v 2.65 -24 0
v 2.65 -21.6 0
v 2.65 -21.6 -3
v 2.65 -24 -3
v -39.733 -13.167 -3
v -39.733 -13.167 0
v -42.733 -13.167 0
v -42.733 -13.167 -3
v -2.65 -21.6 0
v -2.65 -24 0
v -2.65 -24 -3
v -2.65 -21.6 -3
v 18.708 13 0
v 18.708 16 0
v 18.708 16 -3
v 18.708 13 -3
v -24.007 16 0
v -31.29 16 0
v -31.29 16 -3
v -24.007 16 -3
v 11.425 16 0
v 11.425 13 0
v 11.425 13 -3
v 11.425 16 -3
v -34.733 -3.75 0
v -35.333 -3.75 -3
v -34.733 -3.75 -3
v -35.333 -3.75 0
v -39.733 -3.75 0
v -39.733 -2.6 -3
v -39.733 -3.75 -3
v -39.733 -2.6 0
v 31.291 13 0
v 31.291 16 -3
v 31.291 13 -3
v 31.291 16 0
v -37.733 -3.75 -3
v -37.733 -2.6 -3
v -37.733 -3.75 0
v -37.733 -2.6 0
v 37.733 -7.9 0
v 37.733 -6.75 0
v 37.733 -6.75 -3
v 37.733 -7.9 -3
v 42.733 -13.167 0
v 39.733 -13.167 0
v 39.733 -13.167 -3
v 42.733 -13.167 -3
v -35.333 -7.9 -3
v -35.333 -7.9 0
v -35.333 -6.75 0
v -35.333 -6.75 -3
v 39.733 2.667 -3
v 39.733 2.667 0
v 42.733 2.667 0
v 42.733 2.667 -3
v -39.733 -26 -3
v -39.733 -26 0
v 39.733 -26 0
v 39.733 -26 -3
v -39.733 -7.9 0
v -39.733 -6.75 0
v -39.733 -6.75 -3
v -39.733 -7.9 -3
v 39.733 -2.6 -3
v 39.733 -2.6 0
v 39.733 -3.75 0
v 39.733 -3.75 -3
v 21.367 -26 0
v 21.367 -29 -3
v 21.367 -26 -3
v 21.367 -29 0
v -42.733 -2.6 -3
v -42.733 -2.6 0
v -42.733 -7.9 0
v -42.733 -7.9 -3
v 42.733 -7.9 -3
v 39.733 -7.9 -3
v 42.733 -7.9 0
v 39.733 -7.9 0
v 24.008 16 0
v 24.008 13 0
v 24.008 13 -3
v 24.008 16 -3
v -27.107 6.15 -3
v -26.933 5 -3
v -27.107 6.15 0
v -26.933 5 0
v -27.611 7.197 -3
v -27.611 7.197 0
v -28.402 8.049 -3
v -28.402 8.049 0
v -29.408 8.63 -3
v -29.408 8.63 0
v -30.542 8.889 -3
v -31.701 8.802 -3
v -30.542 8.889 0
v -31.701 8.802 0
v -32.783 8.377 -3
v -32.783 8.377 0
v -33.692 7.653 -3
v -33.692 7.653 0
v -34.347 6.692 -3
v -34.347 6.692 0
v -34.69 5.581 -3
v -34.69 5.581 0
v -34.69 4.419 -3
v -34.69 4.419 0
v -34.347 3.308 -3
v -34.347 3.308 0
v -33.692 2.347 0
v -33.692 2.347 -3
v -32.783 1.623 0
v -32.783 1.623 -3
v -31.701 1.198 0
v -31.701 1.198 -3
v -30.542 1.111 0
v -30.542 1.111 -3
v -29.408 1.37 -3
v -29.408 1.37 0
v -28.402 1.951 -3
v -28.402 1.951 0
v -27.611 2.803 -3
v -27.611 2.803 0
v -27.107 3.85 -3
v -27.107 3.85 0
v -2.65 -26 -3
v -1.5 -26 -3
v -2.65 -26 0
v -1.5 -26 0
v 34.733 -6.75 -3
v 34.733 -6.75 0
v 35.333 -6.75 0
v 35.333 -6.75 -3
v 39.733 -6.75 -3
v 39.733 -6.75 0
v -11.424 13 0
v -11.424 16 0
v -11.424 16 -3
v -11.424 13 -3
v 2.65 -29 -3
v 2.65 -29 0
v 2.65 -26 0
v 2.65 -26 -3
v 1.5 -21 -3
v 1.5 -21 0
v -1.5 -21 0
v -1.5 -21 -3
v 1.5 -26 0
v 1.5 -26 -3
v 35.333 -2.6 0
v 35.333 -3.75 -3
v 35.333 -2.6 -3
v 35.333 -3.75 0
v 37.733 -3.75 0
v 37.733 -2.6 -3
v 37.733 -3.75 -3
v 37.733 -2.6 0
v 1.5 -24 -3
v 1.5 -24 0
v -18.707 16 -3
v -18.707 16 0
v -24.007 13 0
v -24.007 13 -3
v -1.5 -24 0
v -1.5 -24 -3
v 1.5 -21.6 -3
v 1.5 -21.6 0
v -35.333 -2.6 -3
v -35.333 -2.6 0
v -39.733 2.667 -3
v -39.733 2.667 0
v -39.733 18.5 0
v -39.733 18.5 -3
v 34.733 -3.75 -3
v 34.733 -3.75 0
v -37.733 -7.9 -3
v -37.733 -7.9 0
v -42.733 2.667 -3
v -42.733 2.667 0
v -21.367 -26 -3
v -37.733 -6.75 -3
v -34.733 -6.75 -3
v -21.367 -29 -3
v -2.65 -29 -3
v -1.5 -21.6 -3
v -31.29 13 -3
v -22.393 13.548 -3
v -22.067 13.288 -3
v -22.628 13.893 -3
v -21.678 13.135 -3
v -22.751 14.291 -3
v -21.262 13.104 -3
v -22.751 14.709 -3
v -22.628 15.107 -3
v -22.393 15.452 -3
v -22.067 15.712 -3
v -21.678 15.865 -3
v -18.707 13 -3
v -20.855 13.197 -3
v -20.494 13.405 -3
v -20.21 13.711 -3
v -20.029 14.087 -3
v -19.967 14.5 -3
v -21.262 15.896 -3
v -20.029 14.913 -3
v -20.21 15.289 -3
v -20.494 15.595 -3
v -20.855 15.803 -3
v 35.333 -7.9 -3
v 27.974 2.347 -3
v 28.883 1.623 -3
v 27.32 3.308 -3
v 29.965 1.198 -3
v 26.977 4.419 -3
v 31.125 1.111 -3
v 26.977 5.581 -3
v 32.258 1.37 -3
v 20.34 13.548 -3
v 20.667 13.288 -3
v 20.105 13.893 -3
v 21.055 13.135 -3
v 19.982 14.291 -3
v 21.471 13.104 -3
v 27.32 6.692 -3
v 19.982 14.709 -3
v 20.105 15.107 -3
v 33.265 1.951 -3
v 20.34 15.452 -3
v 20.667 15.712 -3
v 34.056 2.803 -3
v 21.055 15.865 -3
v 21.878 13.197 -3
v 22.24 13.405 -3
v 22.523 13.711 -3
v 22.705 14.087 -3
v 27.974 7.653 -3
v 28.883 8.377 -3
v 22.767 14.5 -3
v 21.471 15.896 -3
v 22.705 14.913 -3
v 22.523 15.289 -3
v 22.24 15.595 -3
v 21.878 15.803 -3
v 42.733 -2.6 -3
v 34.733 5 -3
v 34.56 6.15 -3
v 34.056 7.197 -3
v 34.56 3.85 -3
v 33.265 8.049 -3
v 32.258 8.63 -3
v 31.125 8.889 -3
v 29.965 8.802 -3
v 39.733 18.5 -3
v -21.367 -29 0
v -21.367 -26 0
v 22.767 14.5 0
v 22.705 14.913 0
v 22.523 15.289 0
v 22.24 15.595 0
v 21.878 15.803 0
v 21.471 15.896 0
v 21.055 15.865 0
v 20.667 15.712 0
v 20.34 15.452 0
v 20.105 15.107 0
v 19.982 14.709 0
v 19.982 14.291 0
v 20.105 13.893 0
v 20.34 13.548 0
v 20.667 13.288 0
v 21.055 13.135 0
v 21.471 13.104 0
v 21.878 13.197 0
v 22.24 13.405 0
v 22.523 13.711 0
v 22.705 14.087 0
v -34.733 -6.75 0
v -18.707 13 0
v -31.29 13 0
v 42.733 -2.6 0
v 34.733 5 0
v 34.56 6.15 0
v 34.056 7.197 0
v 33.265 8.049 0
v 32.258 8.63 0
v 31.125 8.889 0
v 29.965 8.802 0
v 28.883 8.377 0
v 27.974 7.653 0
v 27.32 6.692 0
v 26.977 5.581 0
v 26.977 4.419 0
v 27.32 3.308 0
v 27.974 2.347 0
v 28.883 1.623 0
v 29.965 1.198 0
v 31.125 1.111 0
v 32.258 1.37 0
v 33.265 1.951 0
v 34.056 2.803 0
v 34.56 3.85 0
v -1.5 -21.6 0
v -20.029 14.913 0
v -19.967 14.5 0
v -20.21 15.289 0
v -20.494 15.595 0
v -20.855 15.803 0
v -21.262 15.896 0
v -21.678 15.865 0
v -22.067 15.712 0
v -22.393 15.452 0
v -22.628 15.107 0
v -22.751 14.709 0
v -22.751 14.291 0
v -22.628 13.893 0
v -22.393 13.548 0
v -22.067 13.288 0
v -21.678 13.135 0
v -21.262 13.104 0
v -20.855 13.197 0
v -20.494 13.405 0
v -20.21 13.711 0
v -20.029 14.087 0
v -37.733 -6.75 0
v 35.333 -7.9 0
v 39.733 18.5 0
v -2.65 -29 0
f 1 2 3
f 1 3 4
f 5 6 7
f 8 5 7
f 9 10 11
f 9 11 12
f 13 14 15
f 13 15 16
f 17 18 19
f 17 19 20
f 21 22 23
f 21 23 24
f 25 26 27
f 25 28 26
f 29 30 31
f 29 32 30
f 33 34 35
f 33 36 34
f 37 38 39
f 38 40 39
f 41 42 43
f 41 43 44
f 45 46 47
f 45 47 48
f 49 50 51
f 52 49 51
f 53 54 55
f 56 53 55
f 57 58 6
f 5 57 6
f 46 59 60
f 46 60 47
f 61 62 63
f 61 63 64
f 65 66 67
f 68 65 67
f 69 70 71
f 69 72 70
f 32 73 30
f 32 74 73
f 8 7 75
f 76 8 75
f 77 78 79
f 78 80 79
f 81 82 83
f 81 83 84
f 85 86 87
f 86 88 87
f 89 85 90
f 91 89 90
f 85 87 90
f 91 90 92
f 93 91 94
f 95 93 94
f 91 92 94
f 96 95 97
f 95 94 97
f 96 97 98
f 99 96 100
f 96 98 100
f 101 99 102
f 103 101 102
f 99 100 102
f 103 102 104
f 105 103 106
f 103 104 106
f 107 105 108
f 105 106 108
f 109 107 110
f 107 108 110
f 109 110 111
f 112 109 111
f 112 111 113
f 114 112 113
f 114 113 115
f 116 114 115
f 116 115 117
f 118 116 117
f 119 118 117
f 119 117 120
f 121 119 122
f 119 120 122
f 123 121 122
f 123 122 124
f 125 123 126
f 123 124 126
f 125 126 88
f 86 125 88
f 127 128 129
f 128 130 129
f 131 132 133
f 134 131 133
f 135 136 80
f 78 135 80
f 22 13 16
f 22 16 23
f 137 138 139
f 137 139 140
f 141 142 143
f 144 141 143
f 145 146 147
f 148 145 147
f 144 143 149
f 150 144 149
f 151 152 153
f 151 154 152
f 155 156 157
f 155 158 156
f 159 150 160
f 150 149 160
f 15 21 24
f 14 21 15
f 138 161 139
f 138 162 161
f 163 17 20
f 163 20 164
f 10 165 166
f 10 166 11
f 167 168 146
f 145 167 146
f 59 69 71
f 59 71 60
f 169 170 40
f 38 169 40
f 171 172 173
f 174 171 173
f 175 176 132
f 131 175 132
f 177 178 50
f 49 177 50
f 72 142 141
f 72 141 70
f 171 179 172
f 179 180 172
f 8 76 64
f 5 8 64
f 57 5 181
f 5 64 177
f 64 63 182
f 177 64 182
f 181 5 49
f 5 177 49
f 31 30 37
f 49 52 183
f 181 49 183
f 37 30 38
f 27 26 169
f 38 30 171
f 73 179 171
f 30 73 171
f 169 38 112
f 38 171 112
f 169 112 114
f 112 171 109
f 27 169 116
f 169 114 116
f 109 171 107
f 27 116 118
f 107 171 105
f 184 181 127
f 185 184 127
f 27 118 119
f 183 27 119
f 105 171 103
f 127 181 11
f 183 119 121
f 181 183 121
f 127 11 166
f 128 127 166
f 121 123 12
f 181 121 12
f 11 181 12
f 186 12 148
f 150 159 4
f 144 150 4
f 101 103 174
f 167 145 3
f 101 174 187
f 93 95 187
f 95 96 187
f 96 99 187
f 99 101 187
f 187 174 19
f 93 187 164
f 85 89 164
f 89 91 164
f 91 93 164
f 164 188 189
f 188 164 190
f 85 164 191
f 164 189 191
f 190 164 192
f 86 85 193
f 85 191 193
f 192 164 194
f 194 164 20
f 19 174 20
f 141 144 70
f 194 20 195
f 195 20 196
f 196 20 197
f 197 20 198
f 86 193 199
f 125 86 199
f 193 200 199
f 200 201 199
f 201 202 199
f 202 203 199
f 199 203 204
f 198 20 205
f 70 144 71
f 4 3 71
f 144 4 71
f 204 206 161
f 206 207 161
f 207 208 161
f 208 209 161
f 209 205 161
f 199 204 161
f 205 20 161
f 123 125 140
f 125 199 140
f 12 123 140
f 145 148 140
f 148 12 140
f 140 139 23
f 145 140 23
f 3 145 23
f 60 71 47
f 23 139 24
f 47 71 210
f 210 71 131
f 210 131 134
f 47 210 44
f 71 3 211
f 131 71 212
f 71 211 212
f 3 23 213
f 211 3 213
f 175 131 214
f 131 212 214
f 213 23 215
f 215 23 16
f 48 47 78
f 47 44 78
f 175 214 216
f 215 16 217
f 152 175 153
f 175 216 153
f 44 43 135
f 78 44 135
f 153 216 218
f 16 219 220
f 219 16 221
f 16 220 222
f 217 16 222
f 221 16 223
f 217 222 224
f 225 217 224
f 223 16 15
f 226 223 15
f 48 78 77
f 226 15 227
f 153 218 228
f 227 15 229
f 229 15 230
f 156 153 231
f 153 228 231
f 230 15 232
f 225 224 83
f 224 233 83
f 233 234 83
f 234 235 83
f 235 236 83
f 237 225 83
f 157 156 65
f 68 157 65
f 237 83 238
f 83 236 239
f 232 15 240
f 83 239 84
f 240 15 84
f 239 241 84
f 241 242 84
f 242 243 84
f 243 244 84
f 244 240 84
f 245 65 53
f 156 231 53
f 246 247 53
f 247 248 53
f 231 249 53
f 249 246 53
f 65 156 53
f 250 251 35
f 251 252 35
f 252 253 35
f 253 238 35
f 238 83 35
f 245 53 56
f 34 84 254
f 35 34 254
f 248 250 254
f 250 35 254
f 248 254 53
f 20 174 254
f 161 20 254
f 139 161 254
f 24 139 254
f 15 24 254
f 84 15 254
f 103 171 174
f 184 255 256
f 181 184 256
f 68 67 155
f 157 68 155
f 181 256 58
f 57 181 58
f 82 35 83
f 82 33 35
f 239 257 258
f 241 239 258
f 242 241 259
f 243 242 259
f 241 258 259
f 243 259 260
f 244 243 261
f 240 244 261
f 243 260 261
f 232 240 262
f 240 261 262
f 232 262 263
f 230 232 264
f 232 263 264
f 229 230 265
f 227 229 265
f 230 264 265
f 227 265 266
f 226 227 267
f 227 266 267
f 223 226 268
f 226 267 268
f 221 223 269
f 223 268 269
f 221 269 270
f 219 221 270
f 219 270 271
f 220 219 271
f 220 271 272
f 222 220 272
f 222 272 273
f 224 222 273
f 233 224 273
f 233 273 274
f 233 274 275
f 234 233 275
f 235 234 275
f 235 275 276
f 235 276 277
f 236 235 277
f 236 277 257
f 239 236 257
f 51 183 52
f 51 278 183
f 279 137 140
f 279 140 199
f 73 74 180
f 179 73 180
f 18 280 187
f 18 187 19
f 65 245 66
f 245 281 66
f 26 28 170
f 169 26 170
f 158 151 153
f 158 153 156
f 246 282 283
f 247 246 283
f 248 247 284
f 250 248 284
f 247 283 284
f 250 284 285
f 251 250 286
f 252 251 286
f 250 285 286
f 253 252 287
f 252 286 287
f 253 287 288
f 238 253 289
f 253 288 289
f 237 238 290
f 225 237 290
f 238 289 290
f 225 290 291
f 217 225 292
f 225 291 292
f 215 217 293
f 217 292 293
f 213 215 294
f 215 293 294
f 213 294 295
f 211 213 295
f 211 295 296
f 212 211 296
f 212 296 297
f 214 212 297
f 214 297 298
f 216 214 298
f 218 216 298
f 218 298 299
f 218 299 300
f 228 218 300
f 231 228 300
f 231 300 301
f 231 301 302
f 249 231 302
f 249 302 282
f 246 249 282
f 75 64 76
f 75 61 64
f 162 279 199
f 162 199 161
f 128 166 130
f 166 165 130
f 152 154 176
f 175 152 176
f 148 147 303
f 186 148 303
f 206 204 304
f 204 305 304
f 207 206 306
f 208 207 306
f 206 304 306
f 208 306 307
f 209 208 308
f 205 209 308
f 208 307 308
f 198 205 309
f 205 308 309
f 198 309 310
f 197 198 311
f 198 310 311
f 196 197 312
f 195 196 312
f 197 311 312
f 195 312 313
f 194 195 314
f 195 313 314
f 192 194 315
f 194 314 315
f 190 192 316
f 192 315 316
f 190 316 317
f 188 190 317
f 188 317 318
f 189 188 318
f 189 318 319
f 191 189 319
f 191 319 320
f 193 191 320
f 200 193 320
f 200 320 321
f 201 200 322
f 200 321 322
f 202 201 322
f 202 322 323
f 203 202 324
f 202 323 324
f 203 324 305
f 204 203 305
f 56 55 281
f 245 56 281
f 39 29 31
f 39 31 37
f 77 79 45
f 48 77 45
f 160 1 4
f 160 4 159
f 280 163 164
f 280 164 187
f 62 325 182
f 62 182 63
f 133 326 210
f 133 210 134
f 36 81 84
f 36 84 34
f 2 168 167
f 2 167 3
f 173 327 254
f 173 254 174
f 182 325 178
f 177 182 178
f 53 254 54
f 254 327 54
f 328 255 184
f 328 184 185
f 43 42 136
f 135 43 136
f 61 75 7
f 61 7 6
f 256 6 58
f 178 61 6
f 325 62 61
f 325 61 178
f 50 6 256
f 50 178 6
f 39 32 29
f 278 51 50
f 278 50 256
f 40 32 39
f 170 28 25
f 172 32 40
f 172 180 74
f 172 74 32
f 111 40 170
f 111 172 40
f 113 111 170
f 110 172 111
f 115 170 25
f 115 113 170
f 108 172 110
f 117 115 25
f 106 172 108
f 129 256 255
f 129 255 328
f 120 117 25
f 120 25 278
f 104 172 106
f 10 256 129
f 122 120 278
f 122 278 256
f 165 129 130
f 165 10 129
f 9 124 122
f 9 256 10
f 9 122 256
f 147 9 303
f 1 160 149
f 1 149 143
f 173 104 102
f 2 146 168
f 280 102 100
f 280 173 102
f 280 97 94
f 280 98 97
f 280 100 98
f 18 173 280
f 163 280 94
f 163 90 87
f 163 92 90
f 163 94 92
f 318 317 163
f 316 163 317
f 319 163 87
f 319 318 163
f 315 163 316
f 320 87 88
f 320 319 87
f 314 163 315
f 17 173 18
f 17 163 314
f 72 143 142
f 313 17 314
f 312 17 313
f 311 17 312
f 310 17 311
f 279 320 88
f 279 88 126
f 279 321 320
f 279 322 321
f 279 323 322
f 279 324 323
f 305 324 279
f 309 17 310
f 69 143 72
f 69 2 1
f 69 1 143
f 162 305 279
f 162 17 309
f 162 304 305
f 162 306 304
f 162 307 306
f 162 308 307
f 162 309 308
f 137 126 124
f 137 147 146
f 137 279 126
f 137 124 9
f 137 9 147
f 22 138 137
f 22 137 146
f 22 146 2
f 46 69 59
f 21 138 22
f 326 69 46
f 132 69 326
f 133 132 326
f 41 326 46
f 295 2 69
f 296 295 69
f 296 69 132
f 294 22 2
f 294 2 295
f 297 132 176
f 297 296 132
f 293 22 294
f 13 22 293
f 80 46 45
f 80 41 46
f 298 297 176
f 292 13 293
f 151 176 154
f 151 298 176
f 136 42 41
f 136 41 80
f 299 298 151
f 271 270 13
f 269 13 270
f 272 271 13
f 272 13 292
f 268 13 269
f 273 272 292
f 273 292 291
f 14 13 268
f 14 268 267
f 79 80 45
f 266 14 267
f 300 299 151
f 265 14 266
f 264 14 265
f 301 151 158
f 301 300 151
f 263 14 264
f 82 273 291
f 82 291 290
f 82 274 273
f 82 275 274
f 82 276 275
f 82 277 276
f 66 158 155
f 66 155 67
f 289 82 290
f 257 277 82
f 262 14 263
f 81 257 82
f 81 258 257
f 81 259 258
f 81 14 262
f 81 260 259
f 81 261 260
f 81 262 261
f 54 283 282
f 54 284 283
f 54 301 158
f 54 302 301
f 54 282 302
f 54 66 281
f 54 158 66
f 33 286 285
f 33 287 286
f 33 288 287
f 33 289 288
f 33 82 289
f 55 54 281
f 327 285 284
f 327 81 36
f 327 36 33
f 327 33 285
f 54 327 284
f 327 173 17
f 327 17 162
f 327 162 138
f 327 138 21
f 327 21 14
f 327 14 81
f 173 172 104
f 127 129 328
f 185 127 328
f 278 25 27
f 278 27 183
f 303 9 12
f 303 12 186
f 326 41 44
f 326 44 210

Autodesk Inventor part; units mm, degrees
ref_plane "YZ Plane" through (0, 0, 0) normal (1, 0, 0) x (0, 1, 0)
ref_plane "XZ Plane" through (0, 0, 0) normal (0, 1, 0) x (-1, 0, 0)
ref_plane "XY Plane" through (0, 0, 0) normal (0, 0, 1) x (1, 0, 0)
sketch "Sketch1" plane through (0, 0, 0) normal (0, 0, 1) x (1, 0, 0)
  circle A0 centre (0, 5) radius 7.5
  line L0 (42.7333, 18.5) -> (-42.7333, 18.5)
  line L1 (-42.7333, -29) -> (42.7333, -29)
  circle A1 centre (18.5, 5) radius 2.25
  circle A2 centre (-18.5, 5) radius 2.25
  circle A3 centre (30.8333, 5) radius 3.9
  circle A4 centre (-30.8333, 5) radius 3.9
  line L2 (42.7333, 18.5) -> (42.7333, -29)
  line L3 (-42.7333, -29) -> (-42.7333, 18.5)
  circle A5 centre (0, 5) radius 13.5 construction
  line L4 (0, 41.7106) -> (0, -39.2634) construction
  dimension "d2" = 4.5
  dimension "d3" = 4.5
  dimension "d4" = 7.8
  dimension "d5" = 7.8
  dimension "d48" = 47.5
  dimension "d58" = 15
  dimension "d63" = 27
  dimension "d75" = 34
  dimension "d76" = 30.8333
  dimension "d77" = 85.4667
  dimension "d93" = 47.5
extrude "Extrusion1" add sketch "Sketch1" against normal blind 3 contours A0 | L2 L1 L3 L0 | A1 | A2
sketch "Sketch4" plane through (0, 0, 0) normal (0, 0, 1) x (1, 0, 0)
  line L0 (42.7333, 18.5) -> (39.7333, 18.5)
  line L1 (-42.7333, 18.5) -> (-39.7333, 18.5)
  line L2 (42.7333, -29) -> (21.3667, -29)
  line L3 (21.3667, -26) -> (39.7333, -26)
  line L4 (-42.7333, -29) -> (-21.3667, -29)
  line L5 (-21.3667, -29) -> (-21.3667, -26)
  line L6 (-21.3667, -26) -> (-39.7333, -26)
  line L7 (-42.7333, -23) -> (-42.7333, -29)
  line L8 (42.7333, 18.5) -> (39.7333, 18.5)
  line L9 (39.7333, 18.5) -> (39.7333, 2.6667)
  line L10 (39.7333, 2.6667) -> (42.7333, 2.6667)
  line L11 (42.7333, 2.6667) -> (42.7333, 18.5)
  line L12 (39.7333, -26) -> (39.7333, -13.1667)
  line L13 (39.7333, -13.1667) -> (42.7333, -13.1667)
  line L14 (-42.7333, 2.6667) -> (-39.7333, 2.6667)
  line L15 (-39.7333, 2.6667) -> (-39.7333, 18.5)
  line L16 (-39.7333, 18.5) -> (-42.7333, 18.5)
  line L17 (-42.7333, 18.5) -> (-42.7333, 2.6667)
  line L18 (-42.7333, -29) -> (-39.7333, -29)
  line L19 (-39.7333, -26) -> (-39.7333, -13.1667)
  line L20 (-39.7333, -13.1667) -> (-42.7333, -13.1667)
  line L21 (-42.7333, -13.1667) -> (-42.7333, -29)
  line L22 (21.3667, -29) -> (21.3667, -26)
  line L23 (-21.3667, -23) -> (-21.3667, -29)
  line L24 (-42.7333, 18.5) -> (-39.7333, 18.5)
  line L25 (-42.7333, -29) -> (42.7333, -29) projected
  line L26 (42.7333, 18.5) -> (-42.7333, 18.5) projected
  line L27 (50.1623, -5.25) -> (-50.4474, -5.25) construction
  line L28 (42.7333, -29) -> (42.7333, 18.5) projected
  line L29 (42.7333, -3.75) -> (34.7333, -3.75)
  line L30 (34.7333, -3.75) -> (34.7333, -6.75)
  line L31 (34.7333, -6.75) -> (42.7333, -6.75)
  line L32 (42.7333, -6.75) -> (42.7333, -3.75)
  circle A0 centre (0, 5) radius 13.5 construction
  circle A1 centre (0, 5) radius 7.5 construction
  line L33 (42.7333, -2.6) -> (39.7333, -2.6)
  line L34 (39.7333, -2.6) -> (39.7333, -7.9)
  line L35 (39.7333, -7.9) -> (42.7333, -7.9)
  line L36 (42.7333, -7.9) -> (42.7333, -2.6)
  line L37 (35.3333, -2.6) -> (37.7333, -2.6)
  line L38 (37.7333, -2.6) -> (37.7333, -7.9)
  line L39 (37.7333, -7.9) -> (35.3333, -7.9)
  line L40 (35.3333, -7.9) -> (35.3333, -2.6)
  line L41 (0, 33.7344) -> (0, -36.9537) construction
  line L42 (-42.7333, 18.5) -> (-42.7333, -29) projected
  line L43 (-42.7333, -3.75) -> (-34.7333, -3.75)
  line L44 (-34.7333, -3.75) -> (-34.7333, -6.75)
  line L45 (-34.7333, -6.75) -> (-42.7333, -6.75)
  line L46 (-42.7333, -6.75) -> (-42.7333, -3.75)
  line L47 (-42.7333, -2.6) -> (-39.7333, -2.6)
  line L48 (-39.7333, -2.6) -> (-39.7333, -7.9)
  line L49 (-39.7333, -7.9) -> (-42.7333, -7.9)
  line L50 (-42.7333, -7.9) -> (-42.7333, -2.6)
  line L51 (-35.3333, -2.6) -> (-37.7333, -2.6)
  line L52 (-37.7333, -2.6) -> (-37.7333, -7.9)
  line L53 (-37.7333, -7.9) -> (-35.3333, -7.9)
  line L54 (-35.3333, -7.9) -> (-35.3333, -2.6)
  line L55 (42.7333, -29) -> (-42.7333, -29) projected
  line L56 (-1.5, -29) -> (1.5, -29)
  line L57 (1.5, -29) -> (1.5, -21)
  line L58 (1.5, -21) -> (-1.5, -21)
  line L59 (-1.5, -21) -> (-1.5, -29)
  line L60 (-2.65, -29) -> (2.65, -29)
  line L61 (2.65, -29) -> (2.65, -26)
  line L62 (2.65, -26) -> (-2.65, -26)
  line L63 (-2.65, -26) -> (-2.65, -29)
  line L64 (-2.65, -21.6) -> (2.65, -21.6)
  line L65 (2.65, -21.6) -> (2.65, -24)
  line L66 (2.65, -24) -> (-2.65, -24)
  line L67 (-2.65, -24) -> (-2.65, -21.6)
  line L68 (31.3, 16) -> (24.0167, 16) construction
  line L69 (11.4333, 16) -> (11.4333, 13) construction
  line L70 (11.4333, 13) -> (18.7167, 13) construction
  line L71 (31.3, 13) -> (31.3, 16) construction
  circle A2 centre (30.8333, 5) radius 3.9 projected
  line L72 (21.3667, 17.602) -> (21.3667, 7.8585) construction
  line L73 (18.7167, 16) -> (24.0167, 16) construction
  line L74 (24.0167, 16) -> (24.0167, 13) construction
  line L75 (24.0167, 13) -> (18.7167, 13) construction
  line L76 (18.7167, 13) -> (18.7167, 16) construction
  line L77 (18.7167, 16) -> (11.4333, 16) construction
  line L78 (24.0167, 13) -> (31.3, 13) construction
  circle A3 centre (21.3667, 14.5) radius 1.4
  line L79 (-31.3, 16) -> (-24.0167, 16) construction
  line L80 (-11.4333, 16) -> (-11.4333, 13) construction
  line L81 (-11.4333, 13) -> (-18.7167, 13) construction
  line L82 (-31.3, 13) -> (-31.3, 16) construction
  line L83 (-24.0167, 16) -> (-24.0167, 13) construction
  line L84 (-18.7167, 13) -> (-18.7167, 16) construction
  line L85 (-18.7167, 16) -> (-11.4333, 16) construction
  line L86 (-24.0167, 13) -> (-31.3, 13) construction
  circle A4 centre (-21.3667, 14.5) radius 1.4
  line L87 (42.7333, 18.5) -> (42.7333, -29) projected
  line L88 (42.7333, -13.1667) -> (42.7333, -29)
  line L89 (18.7077, 16) -> (18.7077, 13)
  line L90 (19.8577, 13) -> (18.7077, 13)
  line L91 (19.8577, 16) -> (19.8577, 13)
  line L92 (18.7077, 16) -> (19.8577, 16)
  line L93 (11.4247, 16) -> (18.7077, 16)
  line L94 (11.4247, 13) -> (11.4247, 16)
  line L95 (11.4247, 13) -> (-11.4243, 13)
  line L96 (-11.4243, 16) -> (-11.4243, 13)
  line L97 (-18.7073, 16) -> (-11.4243, 16)
  line L98 (-18.7073, 13) -> (-18.7073, 16)
  line L99 (-18.7073, 13) -> (-19.8573, 13)
  line L100 (-19.8573, 13) -> (-19.8573, 16)
  line L101 (-19.8573, 16) -> (-18.7073, 16)
  line L102 (18.7077, 13) -> (11.4247, 13)
  line L103 (-11.4243, 16) -> (11.4247, 16)
  line L104 (-11.4243, 13) -> (-18.7073, 13)
  line L105 (24.0077, 13) -> (24.0077, 16)
  line L106 (22.8577, 16) -> (24.0077, 16)
  line L107 (22.8577, 13) -> (22.8577, 16)
  line L108 (24.0077, 13) -> (22.8577, 13)
  line L109 (31.2907, 13) -> (24.0077, 13)
  line L110 (31.2907, 16) -> (31.2907, 13)
  line L111 (31.2907, 16) -> (42.7337, 16)
  line L112 (42.7337, 16) -> (42.7337, 13)
  line L113 (42.7337, 13) -> (31.2907, 13)
  line L114 (24.0077, 16) -> (31.2907, 16)
  line L115 (-42.7333, 13) -> (-42.7333, 16)
  line L116 (-42.7333, 16) -> (-31.2903, 16)
  line L117 (-31.2903, 13) -> (-31.2903, 16)
  line L118 (-24.0073, 13) -> (-31.2903, 13)
  line L119 (-24.0073, 16) -> (-24.0073, 13)
  line L120 (-24.0073, 16) -> (-22.8573, 16)
  line L121 (-22.8573, 16) -> (-22.8573, 13)
  line L122 (-22.8573, 13) -> (-24.0073, 13)
  line L123 (-31.2903, 13) -> (-42.7333, 13)
  line L124 (-31.2903, 16) -> (-24.0073, 16)
  dimension "d25" = 3
  dimension "d26" = 3
  dimension "d33" = 15.8333
  dimension "d59" = 8
  dimension "d60" = 3
  dimension "d61" = 47.5
  dimension "d62" = 27
  dimension "d65" = 5.3
  dimension "d66" = 2.4
  dimension "d68" = 5
  dimension "d69" = 3
  dimension "d70" = 8
  dimension "d71" = 5.3
  dimension "d74" = 5
  dimension "d78" = 3
  dimension "d81" = 3
  dimension "d82" = 11
  dimension "d83" = 19.8667
  dimension "d85" = 79.4667
  dimension "d86" = 85.4667
  dimension "d87" = 3
  dimension "d88" = 5.3
  dimension "d89" = 2.8
  dimension "d91" = 15.8333
  dimension "d92" = 21.3667
  dimension "d94" = 2.4
  dimension "d95" = 2.4
extrude "Extrusion2" cut sketch "Sketch4" against normal through all contours L11 L111 L9 L0 | L11 L113 L9 L111 | L15 L116 L17 L1 | L11 L10 L9 L113 | L110 L109 L105 L114 | L15 L123 L17 L116 | L15 L14 L17 L123 | L124 L119 L118 L117 | L28 L29 L34 L33 | L28 L31 L34 L29 | L28 L35 L34 L31 | L34 L31 L38 L29 | L47 L48 L43 L42 | L38 L31 L40 L29 | L29 L40 L37 L38 | L43 L48 L45 L42 | L28 L2 L22 L3 L12 L13 | L38 L39 L40 L31 | L40 L31 L30 L29 | L45 L48 L49 L42 | L43 L52 L45 L48 | L52 L51 L54 L43 | L43 L54 L45 L52 | L20 L19 L6 L5 L4 L7 L21 | L45 L54 L53 L52 | L43 L44 L45 L54 | L25 L57 L62 L61 | L25 L59 L62 L57 | L25 L63 L62 L59 | L62 L59 L66 L57 | L66 L59 L64 L57 | L57 L64 L65 L66 | L66 L67 L64 L59 | L64 L59 L58 L57 | A3 | A4 | L89 L102 L94 L93 | L96 L104 L98 L97
equation "\"d48\" = d75 + 0.5 * d63"
equation "\"d33\" = 0.333333 * d61"
properties part number "X-Anchor_Back"
